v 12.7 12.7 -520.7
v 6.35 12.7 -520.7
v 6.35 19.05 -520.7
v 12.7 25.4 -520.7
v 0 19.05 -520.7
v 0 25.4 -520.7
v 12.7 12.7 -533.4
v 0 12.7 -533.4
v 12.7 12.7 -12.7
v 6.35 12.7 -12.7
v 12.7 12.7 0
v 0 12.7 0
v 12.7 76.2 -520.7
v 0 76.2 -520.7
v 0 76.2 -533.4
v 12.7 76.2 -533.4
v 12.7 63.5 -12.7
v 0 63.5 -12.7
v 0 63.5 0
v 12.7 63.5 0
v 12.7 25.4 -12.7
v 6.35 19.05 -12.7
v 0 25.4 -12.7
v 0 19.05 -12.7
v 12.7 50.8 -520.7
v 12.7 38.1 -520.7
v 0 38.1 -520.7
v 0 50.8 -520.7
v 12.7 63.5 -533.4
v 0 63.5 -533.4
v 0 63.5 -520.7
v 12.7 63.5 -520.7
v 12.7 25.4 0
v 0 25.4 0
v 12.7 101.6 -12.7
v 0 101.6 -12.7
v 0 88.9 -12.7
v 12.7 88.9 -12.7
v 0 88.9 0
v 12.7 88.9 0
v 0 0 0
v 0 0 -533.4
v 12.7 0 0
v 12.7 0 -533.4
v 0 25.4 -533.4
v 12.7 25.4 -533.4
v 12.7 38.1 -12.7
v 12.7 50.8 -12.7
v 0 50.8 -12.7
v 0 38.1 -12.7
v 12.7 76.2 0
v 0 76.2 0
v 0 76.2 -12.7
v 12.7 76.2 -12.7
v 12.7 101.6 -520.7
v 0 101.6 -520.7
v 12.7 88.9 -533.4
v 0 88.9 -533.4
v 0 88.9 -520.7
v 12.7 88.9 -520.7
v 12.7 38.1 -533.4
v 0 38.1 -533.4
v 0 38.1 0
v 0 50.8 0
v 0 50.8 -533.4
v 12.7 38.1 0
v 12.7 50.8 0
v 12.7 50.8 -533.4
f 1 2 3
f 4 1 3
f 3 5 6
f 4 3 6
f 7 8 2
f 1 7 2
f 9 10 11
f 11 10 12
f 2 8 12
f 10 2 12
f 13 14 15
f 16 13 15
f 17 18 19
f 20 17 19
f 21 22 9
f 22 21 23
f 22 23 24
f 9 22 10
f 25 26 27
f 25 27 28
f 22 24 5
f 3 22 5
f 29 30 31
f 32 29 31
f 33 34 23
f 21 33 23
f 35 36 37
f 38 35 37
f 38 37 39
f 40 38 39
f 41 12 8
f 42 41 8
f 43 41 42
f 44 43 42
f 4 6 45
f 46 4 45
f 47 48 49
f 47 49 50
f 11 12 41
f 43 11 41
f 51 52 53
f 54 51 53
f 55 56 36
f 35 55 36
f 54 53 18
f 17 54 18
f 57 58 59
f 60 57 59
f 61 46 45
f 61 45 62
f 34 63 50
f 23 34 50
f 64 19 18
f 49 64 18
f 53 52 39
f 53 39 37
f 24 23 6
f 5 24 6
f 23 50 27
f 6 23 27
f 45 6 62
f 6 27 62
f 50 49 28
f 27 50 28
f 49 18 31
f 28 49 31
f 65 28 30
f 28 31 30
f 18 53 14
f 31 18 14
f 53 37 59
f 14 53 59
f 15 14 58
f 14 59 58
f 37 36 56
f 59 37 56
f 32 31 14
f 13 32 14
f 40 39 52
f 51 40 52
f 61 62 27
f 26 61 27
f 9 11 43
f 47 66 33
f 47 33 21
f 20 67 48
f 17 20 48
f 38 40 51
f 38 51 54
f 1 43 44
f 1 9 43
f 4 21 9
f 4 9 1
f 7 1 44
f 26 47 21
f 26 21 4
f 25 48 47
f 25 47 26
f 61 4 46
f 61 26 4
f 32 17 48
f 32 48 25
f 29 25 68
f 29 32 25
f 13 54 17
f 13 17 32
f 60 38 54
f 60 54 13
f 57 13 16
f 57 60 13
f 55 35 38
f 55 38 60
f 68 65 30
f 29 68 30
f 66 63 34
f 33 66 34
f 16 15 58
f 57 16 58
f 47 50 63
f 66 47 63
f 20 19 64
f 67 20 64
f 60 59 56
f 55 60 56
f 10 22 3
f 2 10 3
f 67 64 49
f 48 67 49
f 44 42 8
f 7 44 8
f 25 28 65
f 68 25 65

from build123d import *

# Parameters (mm, degrees)
BOSS_EXTRUDE1_DEPTH = 12.7
SKETCH2_W           = 557.099300044
SKETCH2_H           = 6.35
CUT_EXTRUDE1_DEPTH  = 6.35


with BuildPart() as part:
    # Sketch1 → Boss-Extrude1 (new body)
    with BuildSketch(Plane(origin=(0, 0, 0), x_dir=(0, 0, -1), z_dir=(1, 0, 0))):
        Polygon((520.7, 25.4), (533.4, 25.4), (533.4, 38.1), (520.7, 38.1), (520.7, 50.8), (533.4, 50.8), (533.4, 63.5), (520.7, 63.5), (520.7, 76.2), (533.4, 76.2), (533.4, 88.9), (520.7, 88.9), (520.7, 101.6), (12.7, 101.6), (12.7, 88.9), (0, 88.9), (0, 76.2), (12.7, 76.2), (12.7, 63.5), (0, 63.5), (0, 50.8), (12.7, 50.8), (12.7, 38.1), (0, 38.1), (0, 25.4), (12.7, 25.4), (12.7, 12.7), (0, 12.7), (0, 0), (533.4, 0), (533.4, 12.7), (520.7, 12.7), align=None)
    extrude(amount=BOSS_EXTRUDE1_DEPTH)

    # Sketch2 → Cut-Extrude1 (cut)
    with BuildSketch(Plane(origin=(0, 0, 0), x_dir=(0, 0, -1), z_dir=(1, 0, 0))):
        with Locations((263.077138041, 15.875)):
            Rectangle(SKETCH2_W, SKETCH2_H)
    extrude(amount=CUT_EXTRUDE1_DEPTH, mode=Mode.SUBTRACT)


solid = part.part
